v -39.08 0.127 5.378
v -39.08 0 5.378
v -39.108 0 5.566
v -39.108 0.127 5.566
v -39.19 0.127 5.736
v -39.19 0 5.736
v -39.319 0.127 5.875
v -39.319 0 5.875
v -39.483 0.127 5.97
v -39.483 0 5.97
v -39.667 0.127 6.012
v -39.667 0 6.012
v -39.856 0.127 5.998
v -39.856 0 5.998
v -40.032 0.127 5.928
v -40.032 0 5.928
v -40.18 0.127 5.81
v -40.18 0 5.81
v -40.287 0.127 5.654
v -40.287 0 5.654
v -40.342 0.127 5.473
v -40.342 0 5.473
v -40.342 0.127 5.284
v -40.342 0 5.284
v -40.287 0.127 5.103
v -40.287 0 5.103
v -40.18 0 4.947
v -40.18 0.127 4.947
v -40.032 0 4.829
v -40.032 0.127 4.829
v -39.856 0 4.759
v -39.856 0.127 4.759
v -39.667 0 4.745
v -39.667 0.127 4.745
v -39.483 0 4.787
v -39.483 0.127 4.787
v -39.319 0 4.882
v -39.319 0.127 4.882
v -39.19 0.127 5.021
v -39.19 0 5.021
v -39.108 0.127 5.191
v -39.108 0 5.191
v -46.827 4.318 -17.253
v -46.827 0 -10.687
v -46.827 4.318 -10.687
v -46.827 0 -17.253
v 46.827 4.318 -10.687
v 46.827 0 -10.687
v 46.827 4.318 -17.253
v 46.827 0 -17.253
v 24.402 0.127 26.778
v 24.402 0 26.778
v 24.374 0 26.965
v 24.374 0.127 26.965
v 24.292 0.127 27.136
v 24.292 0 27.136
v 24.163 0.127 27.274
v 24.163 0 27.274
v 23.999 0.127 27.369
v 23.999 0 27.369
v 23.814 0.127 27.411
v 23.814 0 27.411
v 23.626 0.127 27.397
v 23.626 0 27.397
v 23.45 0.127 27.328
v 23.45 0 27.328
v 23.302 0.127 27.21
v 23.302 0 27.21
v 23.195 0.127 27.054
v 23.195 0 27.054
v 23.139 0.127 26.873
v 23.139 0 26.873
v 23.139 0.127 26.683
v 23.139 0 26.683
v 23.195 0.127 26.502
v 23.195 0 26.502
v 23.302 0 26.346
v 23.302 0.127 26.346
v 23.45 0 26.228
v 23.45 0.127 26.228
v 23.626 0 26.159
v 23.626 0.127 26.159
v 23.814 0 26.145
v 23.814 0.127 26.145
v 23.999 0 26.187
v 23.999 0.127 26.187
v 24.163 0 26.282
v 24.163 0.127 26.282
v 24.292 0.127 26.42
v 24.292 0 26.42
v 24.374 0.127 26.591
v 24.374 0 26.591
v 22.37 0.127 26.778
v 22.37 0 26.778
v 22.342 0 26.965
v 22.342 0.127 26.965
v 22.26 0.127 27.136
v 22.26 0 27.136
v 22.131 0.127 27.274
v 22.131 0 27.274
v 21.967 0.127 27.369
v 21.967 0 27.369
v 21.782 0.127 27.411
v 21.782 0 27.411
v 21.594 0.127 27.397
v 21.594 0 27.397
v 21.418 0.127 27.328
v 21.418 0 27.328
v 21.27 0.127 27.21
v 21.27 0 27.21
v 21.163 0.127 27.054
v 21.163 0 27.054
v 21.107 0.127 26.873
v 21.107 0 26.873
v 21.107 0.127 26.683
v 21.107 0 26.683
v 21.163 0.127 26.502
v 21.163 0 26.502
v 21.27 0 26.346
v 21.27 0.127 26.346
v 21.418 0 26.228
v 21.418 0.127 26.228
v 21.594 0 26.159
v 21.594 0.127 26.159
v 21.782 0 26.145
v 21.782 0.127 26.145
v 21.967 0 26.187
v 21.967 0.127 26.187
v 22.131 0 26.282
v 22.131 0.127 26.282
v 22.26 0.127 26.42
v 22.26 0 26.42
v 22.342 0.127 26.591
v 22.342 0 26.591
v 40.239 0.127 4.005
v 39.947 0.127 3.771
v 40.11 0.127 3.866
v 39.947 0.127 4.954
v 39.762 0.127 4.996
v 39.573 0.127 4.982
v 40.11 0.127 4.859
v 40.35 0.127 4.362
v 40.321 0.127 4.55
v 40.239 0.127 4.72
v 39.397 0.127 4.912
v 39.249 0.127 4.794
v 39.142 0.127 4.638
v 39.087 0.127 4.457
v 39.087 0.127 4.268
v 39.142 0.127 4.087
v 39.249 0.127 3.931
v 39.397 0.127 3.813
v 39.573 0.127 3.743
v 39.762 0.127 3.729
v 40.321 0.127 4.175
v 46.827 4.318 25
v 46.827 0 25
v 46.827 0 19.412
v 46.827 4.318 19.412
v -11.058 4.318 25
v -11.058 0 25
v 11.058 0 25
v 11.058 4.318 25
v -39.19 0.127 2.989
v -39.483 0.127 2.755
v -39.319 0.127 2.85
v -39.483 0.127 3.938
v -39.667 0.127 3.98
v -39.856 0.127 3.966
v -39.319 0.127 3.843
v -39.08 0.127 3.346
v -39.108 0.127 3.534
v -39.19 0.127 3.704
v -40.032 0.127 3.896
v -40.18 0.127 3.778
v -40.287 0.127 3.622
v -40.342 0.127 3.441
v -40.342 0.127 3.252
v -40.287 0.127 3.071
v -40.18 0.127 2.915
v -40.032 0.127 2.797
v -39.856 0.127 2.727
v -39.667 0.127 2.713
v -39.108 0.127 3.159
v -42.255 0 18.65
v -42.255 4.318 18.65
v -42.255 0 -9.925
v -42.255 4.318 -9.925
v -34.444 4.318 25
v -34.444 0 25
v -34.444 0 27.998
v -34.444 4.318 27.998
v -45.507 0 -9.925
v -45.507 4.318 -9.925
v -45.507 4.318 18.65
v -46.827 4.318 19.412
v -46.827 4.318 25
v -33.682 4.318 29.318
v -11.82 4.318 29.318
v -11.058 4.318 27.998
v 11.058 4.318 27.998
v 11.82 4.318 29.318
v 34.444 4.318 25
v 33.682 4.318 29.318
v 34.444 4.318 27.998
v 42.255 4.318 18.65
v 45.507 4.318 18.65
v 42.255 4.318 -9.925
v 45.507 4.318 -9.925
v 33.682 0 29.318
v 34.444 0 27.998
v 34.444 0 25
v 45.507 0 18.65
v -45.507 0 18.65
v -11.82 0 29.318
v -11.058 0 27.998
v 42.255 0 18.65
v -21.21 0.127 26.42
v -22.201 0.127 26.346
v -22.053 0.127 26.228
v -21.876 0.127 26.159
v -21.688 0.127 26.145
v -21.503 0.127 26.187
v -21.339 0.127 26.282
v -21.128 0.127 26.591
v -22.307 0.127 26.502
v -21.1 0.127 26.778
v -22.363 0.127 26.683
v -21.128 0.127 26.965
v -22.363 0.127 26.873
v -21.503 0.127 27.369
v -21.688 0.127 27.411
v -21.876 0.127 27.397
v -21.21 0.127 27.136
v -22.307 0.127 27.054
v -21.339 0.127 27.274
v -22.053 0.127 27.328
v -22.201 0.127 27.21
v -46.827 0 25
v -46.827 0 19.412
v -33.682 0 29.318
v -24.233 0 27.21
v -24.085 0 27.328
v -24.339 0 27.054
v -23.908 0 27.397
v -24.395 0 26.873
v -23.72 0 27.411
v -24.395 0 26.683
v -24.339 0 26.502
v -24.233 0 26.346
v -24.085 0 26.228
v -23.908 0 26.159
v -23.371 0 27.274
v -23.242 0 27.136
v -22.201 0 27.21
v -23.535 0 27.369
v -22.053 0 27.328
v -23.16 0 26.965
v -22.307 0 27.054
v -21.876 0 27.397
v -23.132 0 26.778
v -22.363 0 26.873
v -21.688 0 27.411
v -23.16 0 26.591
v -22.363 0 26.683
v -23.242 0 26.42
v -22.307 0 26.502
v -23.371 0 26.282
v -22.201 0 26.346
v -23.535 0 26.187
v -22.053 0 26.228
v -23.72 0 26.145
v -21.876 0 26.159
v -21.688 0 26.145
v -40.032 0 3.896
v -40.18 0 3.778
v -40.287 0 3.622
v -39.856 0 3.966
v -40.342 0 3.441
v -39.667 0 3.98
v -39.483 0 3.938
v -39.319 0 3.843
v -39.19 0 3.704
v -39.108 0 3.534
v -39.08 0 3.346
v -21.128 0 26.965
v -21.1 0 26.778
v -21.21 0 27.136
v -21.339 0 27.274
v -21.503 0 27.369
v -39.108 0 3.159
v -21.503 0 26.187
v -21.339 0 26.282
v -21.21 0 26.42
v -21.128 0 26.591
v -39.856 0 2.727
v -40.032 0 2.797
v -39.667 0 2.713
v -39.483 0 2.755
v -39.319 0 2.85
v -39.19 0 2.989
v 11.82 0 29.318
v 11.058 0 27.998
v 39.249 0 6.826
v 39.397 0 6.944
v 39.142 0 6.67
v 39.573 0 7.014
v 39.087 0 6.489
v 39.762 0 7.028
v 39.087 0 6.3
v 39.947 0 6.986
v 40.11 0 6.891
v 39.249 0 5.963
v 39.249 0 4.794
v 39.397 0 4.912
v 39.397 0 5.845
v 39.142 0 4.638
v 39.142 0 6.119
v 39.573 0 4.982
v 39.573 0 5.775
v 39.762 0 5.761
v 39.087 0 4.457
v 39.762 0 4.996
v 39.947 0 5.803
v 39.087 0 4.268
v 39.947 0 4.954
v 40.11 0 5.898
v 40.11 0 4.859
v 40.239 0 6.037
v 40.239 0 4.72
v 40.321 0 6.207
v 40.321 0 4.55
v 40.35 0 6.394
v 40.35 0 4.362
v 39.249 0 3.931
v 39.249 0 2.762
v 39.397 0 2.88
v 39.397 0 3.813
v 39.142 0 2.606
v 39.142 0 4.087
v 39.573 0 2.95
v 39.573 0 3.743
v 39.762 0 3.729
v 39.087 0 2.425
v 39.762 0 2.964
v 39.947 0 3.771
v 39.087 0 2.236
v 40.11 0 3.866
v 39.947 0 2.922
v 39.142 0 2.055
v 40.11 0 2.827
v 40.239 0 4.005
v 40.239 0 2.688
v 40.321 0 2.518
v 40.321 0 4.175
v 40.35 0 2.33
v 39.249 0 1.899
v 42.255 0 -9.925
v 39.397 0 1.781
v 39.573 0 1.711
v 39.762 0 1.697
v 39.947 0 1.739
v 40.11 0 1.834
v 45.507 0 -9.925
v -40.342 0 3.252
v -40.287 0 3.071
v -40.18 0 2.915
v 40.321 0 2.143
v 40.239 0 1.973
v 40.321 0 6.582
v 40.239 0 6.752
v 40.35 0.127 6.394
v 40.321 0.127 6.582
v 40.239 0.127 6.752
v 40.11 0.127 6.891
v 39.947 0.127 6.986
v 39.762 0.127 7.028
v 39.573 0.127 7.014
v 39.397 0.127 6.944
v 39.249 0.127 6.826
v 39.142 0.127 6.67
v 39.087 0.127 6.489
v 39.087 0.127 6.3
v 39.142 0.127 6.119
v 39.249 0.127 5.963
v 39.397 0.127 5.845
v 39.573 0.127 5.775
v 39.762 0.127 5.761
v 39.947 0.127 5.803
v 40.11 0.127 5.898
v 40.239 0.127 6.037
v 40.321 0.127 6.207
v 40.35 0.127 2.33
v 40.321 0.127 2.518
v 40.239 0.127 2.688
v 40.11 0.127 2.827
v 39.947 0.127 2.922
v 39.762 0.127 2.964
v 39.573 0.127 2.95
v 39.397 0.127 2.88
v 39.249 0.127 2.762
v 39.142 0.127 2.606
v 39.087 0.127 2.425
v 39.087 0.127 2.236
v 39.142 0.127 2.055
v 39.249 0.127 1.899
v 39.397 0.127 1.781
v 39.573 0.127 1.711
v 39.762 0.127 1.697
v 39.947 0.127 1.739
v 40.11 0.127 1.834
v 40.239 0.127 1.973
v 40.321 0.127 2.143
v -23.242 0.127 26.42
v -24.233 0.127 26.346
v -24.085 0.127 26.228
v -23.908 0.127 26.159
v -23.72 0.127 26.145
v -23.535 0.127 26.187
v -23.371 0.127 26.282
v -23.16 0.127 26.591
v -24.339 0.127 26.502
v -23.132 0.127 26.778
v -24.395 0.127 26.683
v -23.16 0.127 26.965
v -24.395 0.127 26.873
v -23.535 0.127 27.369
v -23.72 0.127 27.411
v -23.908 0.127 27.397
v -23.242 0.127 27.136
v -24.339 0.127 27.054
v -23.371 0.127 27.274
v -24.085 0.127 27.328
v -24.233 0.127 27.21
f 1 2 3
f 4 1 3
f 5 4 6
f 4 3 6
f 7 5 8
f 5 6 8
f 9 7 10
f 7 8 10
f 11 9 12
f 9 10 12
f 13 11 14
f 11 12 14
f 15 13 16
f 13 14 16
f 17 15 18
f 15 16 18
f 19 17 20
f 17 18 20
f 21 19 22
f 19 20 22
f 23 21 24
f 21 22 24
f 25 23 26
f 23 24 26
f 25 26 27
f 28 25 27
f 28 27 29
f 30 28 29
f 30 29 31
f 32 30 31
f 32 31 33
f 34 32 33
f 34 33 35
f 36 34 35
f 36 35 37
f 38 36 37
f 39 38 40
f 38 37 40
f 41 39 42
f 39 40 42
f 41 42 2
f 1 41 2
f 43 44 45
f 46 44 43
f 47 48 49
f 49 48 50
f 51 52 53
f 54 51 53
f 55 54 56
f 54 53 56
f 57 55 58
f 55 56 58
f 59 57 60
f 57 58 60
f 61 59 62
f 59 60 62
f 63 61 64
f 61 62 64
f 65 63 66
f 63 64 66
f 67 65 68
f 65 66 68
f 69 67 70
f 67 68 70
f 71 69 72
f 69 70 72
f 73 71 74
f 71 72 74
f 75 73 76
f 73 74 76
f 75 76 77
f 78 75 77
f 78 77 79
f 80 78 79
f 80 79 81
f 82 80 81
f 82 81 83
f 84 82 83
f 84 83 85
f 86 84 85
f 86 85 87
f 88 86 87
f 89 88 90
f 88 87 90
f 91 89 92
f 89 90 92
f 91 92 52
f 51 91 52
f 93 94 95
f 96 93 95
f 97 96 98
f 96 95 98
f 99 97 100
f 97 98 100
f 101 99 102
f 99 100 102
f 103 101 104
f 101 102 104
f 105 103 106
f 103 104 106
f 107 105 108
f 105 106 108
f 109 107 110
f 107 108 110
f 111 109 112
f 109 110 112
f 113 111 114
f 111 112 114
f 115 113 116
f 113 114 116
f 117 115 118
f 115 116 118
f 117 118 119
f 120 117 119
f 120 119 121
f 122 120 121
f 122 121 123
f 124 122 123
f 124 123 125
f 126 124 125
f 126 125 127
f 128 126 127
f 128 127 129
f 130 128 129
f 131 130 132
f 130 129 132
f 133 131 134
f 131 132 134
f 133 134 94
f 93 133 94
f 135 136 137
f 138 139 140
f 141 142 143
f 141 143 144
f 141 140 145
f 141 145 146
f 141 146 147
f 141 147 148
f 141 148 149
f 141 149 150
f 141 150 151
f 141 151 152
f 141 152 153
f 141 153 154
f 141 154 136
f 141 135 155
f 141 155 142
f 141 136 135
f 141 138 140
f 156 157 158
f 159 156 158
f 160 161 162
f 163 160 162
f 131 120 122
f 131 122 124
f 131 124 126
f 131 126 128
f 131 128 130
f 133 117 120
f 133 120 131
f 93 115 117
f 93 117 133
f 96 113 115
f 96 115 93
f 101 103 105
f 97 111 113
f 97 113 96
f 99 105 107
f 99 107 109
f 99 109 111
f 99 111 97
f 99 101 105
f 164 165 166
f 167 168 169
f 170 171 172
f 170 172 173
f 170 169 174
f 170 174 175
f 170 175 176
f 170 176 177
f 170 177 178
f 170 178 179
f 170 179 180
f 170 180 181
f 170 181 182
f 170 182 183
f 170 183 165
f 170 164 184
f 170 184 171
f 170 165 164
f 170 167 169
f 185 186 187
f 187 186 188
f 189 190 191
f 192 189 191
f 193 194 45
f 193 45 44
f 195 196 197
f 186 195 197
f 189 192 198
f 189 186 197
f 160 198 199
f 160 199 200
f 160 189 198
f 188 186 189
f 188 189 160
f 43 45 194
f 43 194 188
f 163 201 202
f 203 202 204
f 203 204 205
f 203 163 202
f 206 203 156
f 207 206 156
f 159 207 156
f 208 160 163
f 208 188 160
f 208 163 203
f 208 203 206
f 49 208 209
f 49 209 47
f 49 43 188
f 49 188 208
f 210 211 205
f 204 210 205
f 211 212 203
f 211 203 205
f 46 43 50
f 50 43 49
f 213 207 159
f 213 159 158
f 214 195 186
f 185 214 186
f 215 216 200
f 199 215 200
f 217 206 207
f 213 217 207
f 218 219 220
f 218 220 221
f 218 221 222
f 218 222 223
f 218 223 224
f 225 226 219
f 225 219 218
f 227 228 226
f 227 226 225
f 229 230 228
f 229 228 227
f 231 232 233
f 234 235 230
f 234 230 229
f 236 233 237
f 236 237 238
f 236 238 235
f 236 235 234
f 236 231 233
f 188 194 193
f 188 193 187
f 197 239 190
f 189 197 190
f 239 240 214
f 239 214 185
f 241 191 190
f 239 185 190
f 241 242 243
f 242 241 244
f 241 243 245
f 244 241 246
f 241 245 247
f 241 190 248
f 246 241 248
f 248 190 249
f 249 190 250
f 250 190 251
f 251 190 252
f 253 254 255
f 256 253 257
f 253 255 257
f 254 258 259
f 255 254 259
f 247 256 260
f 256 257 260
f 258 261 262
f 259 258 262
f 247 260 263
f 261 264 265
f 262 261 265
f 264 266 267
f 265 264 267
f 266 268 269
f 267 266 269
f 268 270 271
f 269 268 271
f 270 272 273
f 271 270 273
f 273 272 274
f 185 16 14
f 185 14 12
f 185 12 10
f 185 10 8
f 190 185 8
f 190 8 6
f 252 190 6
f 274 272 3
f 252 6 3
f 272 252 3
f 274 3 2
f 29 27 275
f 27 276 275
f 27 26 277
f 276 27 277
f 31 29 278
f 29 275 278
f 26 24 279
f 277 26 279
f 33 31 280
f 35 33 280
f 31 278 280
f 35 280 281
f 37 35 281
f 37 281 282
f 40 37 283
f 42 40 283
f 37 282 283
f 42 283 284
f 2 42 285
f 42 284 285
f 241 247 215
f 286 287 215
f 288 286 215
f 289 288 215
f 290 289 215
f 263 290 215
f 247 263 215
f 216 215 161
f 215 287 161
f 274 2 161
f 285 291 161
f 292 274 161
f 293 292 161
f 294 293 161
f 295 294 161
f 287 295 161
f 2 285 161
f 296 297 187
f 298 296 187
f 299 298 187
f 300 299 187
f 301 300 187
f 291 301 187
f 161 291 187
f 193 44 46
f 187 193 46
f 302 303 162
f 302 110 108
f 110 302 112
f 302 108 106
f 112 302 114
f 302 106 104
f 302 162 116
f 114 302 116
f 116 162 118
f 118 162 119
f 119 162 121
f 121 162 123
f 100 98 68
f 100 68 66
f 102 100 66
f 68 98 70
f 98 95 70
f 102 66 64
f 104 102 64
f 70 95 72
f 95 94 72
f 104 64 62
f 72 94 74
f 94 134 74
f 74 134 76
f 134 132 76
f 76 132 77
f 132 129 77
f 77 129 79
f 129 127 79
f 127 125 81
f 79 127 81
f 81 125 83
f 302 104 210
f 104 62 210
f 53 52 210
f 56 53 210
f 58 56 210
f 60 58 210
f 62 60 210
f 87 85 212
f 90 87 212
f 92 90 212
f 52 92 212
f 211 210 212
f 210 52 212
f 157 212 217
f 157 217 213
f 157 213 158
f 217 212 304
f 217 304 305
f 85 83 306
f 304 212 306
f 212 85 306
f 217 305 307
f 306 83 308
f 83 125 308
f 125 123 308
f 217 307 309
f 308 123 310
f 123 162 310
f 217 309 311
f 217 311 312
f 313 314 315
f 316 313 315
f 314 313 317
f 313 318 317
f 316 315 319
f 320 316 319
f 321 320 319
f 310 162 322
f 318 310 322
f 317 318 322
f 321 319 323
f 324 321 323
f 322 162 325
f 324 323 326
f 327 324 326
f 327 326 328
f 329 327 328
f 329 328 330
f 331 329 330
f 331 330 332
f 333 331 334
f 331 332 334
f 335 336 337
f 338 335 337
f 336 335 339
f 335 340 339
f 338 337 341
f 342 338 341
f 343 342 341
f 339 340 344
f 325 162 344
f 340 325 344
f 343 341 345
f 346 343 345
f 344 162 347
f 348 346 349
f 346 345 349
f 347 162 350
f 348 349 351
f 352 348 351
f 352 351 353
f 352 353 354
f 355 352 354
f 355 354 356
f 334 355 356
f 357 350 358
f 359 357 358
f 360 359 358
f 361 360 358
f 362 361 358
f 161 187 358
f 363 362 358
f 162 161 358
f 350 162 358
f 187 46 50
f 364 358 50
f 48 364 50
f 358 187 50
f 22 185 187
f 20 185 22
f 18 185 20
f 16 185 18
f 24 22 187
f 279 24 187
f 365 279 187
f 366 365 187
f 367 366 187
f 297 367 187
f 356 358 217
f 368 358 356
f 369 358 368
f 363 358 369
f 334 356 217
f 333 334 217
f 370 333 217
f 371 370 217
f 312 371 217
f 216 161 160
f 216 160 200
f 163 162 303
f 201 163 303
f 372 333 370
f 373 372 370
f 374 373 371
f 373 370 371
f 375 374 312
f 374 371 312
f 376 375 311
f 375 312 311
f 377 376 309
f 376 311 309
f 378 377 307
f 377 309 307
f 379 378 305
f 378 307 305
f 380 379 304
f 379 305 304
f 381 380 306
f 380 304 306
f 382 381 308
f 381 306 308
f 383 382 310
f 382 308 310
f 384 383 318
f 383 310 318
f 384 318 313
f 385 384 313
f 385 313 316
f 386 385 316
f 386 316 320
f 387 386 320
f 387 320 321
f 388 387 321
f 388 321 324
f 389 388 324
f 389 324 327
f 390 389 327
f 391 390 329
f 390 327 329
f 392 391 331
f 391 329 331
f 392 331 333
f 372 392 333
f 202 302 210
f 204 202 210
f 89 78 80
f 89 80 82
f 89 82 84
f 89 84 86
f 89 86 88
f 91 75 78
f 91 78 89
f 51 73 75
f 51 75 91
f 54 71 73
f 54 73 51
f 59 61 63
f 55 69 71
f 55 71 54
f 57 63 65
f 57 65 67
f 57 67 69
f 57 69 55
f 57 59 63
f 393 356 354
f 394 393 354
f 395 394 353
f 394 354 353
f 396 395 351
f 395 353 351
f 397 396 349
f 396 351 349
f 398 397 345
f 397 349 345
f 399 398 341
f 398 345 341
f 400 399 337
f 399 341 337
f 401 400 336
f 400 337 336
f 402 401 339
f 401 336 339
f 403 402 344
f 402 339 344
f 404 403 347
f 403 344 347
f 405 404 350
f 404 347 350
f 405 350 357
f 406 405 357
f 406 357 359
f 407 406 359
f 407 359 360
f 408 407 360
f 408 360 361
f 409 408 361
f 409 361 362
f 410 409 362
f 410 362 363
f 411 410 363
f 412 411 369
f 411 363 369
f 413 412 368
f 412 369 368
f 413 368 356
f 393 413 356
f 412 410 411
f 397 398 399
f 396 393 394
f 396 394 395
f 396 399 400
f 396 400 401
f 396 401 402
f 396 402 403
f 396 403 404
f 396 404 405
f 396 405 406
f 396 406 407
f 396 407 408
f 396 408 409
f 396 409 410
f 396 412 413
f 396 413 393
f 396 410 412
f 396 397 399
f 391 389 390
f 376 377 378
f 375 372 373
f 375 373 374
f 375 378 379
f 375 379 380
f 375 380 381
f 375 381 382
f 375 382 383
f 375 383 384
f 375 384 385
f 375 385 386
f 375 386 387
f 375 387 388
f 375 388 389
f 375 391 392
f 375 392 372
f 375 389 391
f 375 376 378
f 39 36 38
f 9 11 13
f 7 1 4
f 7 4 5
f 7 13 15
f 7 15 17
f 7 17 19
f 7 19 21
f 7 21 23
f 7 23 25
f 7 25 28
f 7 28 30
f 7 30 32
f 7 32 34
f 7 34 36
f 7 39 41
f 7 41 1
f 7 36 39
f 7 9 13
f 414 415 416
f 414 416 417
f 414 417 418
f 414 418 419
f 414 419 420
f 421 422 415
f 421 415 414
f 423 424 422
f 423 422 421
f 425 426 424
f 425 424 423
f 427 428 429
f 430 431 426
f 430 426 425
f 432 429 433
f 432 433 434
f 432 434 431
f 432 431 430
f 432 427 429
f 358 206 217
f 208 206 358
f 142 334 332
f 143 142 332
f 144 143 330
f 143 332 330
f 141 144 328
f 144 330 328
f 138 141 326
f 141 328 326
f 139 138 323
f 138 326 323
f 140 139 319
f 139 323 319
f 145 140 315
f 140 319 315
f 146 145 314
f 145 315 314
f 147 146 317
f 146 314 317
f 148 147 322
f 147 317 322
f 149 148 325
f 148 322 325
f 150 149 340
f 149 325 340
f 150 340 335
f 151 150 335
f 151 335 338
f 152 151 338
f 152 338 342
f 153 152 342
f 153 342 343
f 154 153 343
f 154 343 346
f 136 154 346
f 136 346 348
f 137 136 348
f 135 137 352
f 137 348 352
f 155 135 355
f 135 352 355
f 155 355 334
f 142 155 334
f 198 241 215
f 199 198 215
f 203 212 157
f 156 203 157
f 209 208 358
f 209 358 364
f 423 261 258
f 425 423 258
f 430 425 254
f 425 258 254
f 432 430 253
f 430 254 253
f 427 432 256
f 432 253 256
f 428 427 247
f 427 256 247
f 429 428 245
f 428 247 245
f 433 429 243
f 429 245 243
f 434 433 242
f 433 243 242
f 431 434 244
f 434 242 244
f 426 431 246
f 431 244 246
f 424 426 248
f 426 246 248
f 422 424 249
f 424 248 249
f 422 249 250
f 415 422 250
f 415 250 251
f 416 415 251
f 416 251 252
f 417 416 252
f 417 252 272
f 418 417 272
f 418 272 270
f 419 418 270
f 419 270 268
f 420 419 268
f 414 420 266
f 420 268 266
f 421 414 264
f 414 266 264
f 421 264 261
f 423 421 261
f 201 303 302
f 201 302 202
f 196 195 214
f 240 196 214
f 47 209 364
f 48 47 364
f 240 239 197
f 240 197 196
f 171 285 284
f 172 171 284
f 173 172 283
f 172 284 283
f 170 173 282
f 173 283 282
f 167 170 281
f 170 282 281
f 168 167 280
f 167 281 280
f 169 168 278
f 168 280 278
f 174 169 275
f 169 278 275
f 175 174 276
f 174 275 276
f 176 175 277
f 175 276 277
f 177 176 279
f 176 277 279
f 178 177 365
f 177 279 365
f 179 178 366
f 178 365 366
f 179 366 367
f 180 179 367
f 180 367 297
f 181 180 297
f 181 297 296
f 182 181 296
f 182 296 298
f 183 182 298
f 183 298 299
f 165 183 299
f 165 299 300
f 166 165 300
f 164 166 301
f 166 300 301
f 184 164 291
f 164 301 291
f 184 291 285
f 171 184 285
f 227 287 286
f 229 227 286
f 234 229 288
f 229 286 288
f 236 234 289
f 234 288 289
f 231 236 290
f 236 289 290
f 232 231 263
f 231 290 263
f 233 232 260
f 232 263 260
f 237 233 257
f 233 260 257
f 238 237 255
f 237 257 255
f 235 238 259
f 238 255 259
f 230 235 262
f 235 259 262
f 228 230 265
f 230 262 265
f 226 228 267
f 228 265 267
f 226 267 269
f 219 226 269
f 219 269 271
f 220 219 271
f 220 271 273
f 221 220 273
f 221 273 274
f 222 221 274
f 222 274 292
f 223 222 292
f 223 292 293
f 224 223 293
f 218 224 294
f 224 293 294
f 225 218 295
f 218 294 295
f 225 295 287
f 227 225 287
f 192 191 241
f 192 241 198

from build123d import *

# Parameters (mm, degrees)
SKETCH1_W             = 93.653112922
SKETCH1_H             = 50
BOSS_EXTRUDE1_DEPTH   = 4.318
SKETCH3_W             = 23.386037641
SKETCH3_H             = 4.318
BOSS_EXTRUDE2_DEPTH   = 4.318
CUT_EXTRUDE1_REACH    = 6.318
SKETCH4_W             = 4.572
SKETCH4_H             = 28.575
CUT_EXTRUDE2_REACH    = 6.318
SKETCH5_W             = 93.653112922
SKETCH5_H             = 7.747
SKETCH8_R             = 0.635
CUT_EXTRUDE4_DEPTH    = 0.127
CHAMFER1_SIZE         = 0.762
CHAMFER1_SIZE2        = 1.319822715
CHAMFER1_PART_2_SIZE  = 0.762
CHAMFER1_PART_2_SIZE2 = 1.319822715
CHAMFER1_PART_3_SIZE  = 0.762
CHAMFER1_PART_3_SIZE2 = 1.319822715
CHAMFER1_PART_4_SIZE  = 0.762
CHAMFER1_PART_4_SIZE2 = 1.319822715
CHAMFER2_SIZE         = 0.762
CHAMFER2_SIZE2        = 1.319822715
CHAMFER2_PART_2_SIZE  = 0.762
CHAMFER2_PART_2_SIZE2 = 1.319822715
CHAMFER2_PART_3_SIZE  = 0.762
CHAMFER2_PART_3_SIZE2 = 1.319822715
CHAMFER2_PART_4_SIZE  = 0.762
CHAMFER2_PART_4_SIZE2 = 1.319822715


with BuildPart() as part:
    # Sketch1 → Boss-Extrude1 (new body)
    with BuildSketch(Plane(origin=(0, 0, 0), x_dir=(1, 0, 0), z_dir=(0, 1, 0))):
        Rectangle(SKETCH1_W, SKETCH1_H)
    extrude(amount=BOSS_EXTRUDE1_DEPTH)

    # Sketch3 → Boss-Extrude2 (add)
    with BuildSketch(Plane.XZ):
        with Locations((-22.751037641, 27.159)):
            Rectangle(SKETCH3_W, SKETCH3_H)
        with Locations((22.751037641, 27.159)):
            Rectangle(SKETCH3_W, SKETCH3_H)
    extrude(amount=-BOSS_EXTRUDE2_DEPTH)

    # Sketch4 → Cut-Extrude1 (cut, up to next)
    with BuildSketch(Plane(origin=(0, 4.318, 0), x_dir=(1, 0, 0), z_dir=(0, 1, 0)), mode=Mode.PRIVATE) as cut_extrude1_sk1:
        with Locations((-44.540556461, -4.3625)):
            Rectangle(SKETCH4_W, SKETCH4_H)
    cut_extrude1_tool1 = extrude(cut_extrude1_sk1.sketch, amount=-CUT_EXTRUDE1_REACH, mode=Mode.PRIVATE) & part.part
    add(cut_extrude1_tool1.solids().sort_by_distance((-44.540556, 4.318, 4.3625))[0], mode=Mode.SUBTRACT)
    # Sketch4 → Cut-Extrude1 (cut, up to next)
    with BuildSketch(Plane(origin=(0, 4.318, 0), x_dir=(1, 0, 0), z_dir=(0, 1, 0)), mode=Mode.PRIVATE) as cut_extrude1_sk2:
        with Locations((44.540556461, -4.3625)):
            Rectangle(SKETCH4_W, SKETCH4_H)
    cut_extrude1_tool2 = extrude(cut_extrude1_sk2.sketch, amount=-CUT_EXTRUDE1_REACH, mode=Mode.PRIVATE) & part.part
    add(cut_extrude1_tool2.solids().sort_by_distance((44.540556, 4.318, 4.3625))[0], mode=Mode.SUBTRACT)

    # Sketch5 → Cut-Extrude2 (cut, up to next)
    with BuildSketch(Plane(origin=(0, 4.318, 0), x_dir=(1, 0, 0), z_dir=(0, 1, 0)), mode=Mode.PRIVATE) as cut_extrude2_sk1:
        with Locations((0, 21.1265)):
            Rectangle(SKETCH5_W, SKETCH5_H)
    cut_extrude2_tool1 = extrude(cut_extrude2_sk1.sketch, amount=-CUT_EXTRUDE2_REACH, mode=Mode.PRIVATE) & part.part
    add(cut_extrude2_tool1.solids().sort_by_distance((0, 4.318, -21.1265))[0], mode=Mode.SUBTRACT)

    # Sketch8 → Cut-Extrude4 (cut)
    with BuildSketch(Plane.XZ):
        with Locations((21.735037641, 26.778)):
            Circle(SKETCH8_R)
        with Locations((23.767037641, 26.778)):
            Circle(SKETCH8_R)
        with Locations((39.714556461, 6.3945)):
            Circle(SKETCH8_R)
        with Locations((39.714556461, 4.3625)):
            Circle(SKETCH8_R)
        with Locations((39.714556461, 2.3305)):
            Circle(SKETCH8_R)
        with Locations((-23.767037641, 26.778)):
            Circle(SKETCH8_R)
        with Locations((-21.735037641, 26.778)):
            Circle(SKETCH8_R)
        with Locations((-39.714556461, 5.3785)):
            Circle(SKETCH8_R)
        with Locations((-39.714556461, 3.3465)):
            Circle(SKETCH8_R)
    extrude(amount=-CUT_EXTRUDE4_DEPTH, mode=Mode.SUBTRACT)

    # Chamfer1
    chamfer1_edges = [part.edges().sort_by_distance(p)[0] for p in [
        (-34.444056461, 2.159, 29.318),
    ]]
    chamfer1_side = [part.faces().sort_by_distance(p)[0] for p in [
        (-22.751037641, 2.159, 29.318),
    ]]
    chamfer(chamfer1_edges, length=CHAMFER1_SIZE, length2=CHAMFER1_SIZE2, reference=chamfer1_side[0])

    # Chamfer1 part 2
    chamfer1_part_2_edges = [part.edges().sort_by_distance(p)[0] for p in [
        (11.05801882, 2.159, 29.318),
    ]]
    chamfer1_part_2_side = [part.faces().sort_by_distance(p)[0] for p in [
        (22.751037641, 2.159, 29.318),
    ]]
    chamfer(chamfer1_part_2_edges, length=CHAMFER1_PART_2_SIZE, length2=CHAMFER1_PART_2_SIZE2, reference=chamfer1_part_2_side[0])

    # Chamfer1 part 3
    chamfer1_part_3_edges = [part.edges().sort_by_distance(p)[0] for p in [
        (-46.826556461, 2.159, -9.925),
    ]]
    chamfer1_part_3_side = [part.faces().sort_by_distance(p)[0] for p in [
        (-46.826556461, 2.159, -13.589),
    ]]
    chamfer(chamfer1_part_3_edges, length=CHAMFER1_PART_3_SIZE, length2=CHAMFER1_PART_3_SIZE2, reference=chamfer1_part_3_side[0])

    # Chamfer1 part 4
    chamfer1_part_4_edges = [part.edges().sort_by_distance(p)[0] for p in [
        (46.826556461, 2.159, 18.65),
    ]]
    chamfer1_part_4_side = [part.faces().sort_by_distance(p)[0] for p in [
        (46.826556461, 2.159, 21.825),
    ]]
    chamfer(chamfer1_part_4_edges, length=CHAMFER1_PART_4_SIZE, length2=CHAMFER1_PART_4_SIZE2, reference=chamfer1_part_4_side[0])

    # Chamfer2
    chamfer2_edges = [part.edges().sort_by_distance(p)[0] for p in [
        (-11.05801882, 2.159, 29.318),
    ]]
    chamfer2_side = [part.faces().sort_by_distance(p)[0] for p in [
        (-22.370037641, 2.159, 29.318),
    ]]
    chamfer(chamfer2_edges, length=CHAMFER2_SIZE, length2=CHAMFER2_SIZE2, reference=chamfer2_side[0])

    # Chamfer2 part 2
    chamfer2_part_2_edges = [part.edges().sort_by_distance(p)[0] for p in [
        (34.444056461, 2.159, 29.318),
    ]]
    chamfer2_part_2_side = [part.faces().sort_by_distance(p)[0] for p in [
        (23.132037641, 2.159, 29.318),
    ]]
    chamfer(chamfer2_part_2_edges, length=CHAMFER2_PART_2_SIZE, length2=CHAMFER2_PART_2_SIZE2, reference=chamfer2_part_2_side[0])

    # Chamfer2 part 3
    chamfer2_part_3_edges = [part.edges().sort_by_distance(p)[0] for p in [
        (-46.826556461, 2.159, 18.65),
    ]]
    chamfer2_part_3_side = [part.faces().sort_by_distance(p)[0] for p in [
        (-46.826556461, 2.159, 21.825),
    ]]
    chamfer(chamfer2_part_3_edges, length=CHAMFER2_PART_3_SIZE, length2=CHAMFER2_PART_3_SIZE2, reference=chamfer2_part_3_side[0])

    # Chamfer2 part 4
    chamfer2_part_4_edges = [part.edges().sort_by_distance(p)[0] for p in [
        (46.826556461, 2.159, -9.925),
    ]]
    chamfer2_part_4_side = [part.faces().sort_by_distance(p)[0] for p in [
        (46.826556461, 2.159, -13.589),
    ]]
    chamfer(chamfer2_part_4_edges, length=CHAMFER2_PART_4_SIZE, length2=CHAMFER2_PART_4_SIZE2, reference=chamfer2_part_4_side[0])


solid = part.part
